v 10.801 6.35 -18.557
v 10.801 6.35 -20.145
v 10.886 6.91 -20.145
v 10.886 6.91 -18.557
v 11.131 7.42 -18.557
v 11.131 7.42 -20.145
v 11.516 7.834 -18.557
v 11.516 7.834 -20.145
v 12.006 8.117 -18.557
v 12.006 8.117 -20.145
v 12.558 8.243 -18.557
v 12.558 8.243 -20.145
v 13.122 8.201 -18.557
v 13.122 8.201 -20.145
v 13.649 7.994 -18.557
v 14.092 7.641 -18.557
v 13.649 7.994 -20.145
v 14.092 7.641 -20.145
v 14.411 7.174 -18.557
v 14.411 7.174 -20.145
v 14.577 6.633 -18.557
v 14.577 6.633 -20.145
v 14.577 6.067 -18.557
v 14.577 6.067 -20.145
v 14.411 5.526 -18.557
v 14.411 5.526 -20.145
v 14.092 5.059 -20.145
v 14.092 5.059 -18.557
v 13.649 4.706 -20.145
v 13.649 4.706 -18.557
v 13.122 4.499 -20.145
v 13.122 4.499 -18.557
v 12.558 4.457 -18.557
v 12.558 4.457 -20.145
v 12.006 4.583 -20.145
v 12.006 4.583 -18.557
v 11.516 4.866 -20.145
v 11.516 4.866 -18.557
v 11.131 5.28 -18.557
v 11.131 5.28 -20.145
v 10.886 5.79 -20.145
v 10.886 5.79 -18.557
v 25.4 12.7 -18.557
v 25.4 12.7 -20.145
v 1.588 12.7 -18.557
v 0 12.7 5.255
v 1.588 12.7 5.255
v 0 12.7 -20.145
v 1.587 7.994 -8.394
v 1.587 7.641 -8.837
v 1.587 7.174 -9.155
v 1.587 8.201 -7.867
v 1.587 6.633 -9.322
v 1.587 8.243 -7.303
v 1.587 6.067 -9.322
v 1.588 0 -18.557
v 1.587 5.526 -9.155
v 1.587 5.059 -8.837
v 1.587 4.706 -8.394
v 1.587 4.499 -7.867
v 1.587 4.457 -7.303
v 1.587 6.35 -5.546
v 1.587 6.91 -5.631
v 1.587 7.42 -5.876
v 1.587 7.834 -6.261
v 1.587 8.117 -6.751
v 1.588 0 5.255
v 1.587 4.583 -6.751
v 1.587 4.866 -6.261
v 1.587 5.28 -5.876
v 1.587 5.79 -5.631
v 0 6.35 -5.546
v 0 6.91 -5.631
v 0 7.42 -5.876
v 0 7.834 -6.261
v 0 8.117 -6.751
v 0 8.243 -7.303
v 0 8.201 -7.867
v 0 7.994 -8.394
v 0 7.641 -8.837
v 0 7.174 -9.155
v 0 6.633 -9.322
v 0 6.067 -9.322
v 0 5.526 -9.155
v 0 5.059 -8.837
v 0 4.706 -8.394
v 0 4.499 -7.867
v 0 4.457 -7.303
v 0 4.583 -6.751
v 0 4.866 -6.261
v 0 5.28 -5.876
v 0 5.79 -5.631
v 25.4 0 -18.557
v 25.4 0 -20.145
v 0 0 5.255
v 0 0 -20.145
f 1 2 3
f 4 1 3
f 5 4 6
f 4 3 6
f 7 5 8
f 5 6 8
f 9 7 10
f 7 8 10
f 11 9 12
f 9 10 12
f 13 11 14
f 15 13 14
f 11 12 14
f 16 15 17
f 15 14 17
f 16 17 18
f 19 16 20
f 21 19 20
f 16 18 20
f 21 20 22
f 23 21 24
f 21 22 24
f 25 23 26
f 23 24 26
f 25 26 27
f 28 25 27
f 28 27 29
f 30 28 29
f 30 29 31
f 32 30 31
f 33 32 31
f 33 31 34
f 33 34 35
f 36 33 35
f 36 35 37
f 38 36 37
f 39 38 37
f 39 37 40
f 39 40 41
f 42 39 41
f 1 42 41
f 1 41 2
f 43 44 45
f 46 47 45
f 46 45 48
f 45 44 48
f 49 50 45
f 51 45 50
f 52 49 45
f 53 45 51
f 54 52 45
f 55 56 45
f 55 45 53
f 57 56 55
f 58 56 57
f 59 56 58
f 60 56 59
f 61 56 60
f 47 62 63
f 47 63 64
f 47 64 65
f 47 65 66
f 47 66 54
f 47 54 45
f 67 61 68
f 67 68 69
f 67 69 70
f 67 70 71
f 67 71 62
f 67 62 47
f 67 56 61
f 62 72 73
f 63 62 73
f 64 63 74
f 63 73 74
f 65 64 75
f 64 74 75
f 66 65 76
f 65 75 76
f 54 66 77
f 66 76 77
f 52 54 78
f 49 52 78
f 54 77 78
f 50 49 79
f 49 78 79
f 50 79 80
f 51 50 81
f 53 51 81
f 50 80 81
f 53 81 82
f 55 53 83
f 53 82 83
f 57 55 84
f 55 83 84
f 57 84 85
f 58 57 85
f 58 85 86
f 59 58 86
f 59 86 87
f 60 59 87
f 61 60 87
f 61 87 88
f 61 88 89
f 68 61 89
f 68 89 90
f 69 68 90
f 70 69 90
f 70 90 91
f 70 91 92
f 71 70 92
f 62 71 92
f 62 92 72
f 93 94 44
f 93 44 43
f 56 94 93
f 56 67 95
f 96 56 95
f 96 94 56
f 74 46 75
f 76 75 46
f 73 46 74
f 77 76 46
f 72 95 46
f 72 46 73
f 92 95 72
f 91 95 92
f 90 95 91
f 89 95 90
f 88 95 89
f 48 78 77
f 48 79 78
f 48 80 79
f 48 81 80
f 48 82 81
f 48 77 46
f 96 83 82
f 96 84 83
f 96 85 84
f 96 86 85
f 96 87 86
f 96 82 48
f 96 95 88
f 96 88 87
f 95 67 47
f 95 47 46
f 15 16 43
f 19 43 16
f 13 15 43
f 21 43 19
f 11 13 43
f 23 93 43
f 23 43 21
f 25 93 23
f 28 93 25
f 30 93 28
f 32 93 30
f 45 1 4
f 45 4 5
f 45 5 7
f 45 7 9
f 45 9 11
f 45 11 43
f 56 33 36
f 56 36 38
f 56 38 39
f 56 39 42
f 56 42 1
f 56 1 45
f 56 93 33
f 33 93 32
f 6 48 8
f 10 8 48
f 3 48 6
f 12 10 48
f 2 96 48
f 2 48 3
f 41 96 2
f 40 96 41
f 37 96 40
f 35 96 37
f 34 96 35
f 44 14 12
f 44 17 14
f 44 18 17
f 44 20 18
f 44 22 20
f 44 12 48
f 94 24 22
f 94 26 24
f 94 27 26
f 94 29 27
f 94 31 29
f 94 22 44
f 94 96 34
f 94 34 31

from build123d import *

# Parameters (mm, degrees)
BOSS_EXTRUDE1_DEPTH   = 12.7
F_6_CLEARANCE_HOLE2_D = 3.7973
F_6_CLEARANCE_HOLE1_D = 3.7973


with BuildPart() as part:
    # Sketch1 → Boss-Extrude1 (new body)
    with BuildSketch(Plane(origin=(0, 0, 0), x_dir=(1, 0, 0), z_dir=(0, 1, 0))):
        Polygon((0, -5.255172414), (0, 20.144827586), (25.4, 20.144827586), (25.4, 18.557327586), (1.5875, 18.557327586), (1.5875, -5.255172414), align=None)
    extrude(amount=BOSS_EXTRUDE1_DEPTH)

    # #6 Clearance Hole2 (through all)
    with Locations(Plane(origin=(1.5875, 0, 0), x_dir=(0, 0, -1), z_dir=(1, 0, 0))):
        with Locations((7.444827586, 6.35)):
            Hole(F_6_CLEARANCE_HOLE2_D / 2)

    # #6 Clearance Hole1 (through all)
    with Locations(Plane.XY.offset(-18.557327586)):
        with Locations((12.7, 6.35)):
            Hole(F_6_CLEARANCE_HOLE1_D / 2)


solid = part.part
